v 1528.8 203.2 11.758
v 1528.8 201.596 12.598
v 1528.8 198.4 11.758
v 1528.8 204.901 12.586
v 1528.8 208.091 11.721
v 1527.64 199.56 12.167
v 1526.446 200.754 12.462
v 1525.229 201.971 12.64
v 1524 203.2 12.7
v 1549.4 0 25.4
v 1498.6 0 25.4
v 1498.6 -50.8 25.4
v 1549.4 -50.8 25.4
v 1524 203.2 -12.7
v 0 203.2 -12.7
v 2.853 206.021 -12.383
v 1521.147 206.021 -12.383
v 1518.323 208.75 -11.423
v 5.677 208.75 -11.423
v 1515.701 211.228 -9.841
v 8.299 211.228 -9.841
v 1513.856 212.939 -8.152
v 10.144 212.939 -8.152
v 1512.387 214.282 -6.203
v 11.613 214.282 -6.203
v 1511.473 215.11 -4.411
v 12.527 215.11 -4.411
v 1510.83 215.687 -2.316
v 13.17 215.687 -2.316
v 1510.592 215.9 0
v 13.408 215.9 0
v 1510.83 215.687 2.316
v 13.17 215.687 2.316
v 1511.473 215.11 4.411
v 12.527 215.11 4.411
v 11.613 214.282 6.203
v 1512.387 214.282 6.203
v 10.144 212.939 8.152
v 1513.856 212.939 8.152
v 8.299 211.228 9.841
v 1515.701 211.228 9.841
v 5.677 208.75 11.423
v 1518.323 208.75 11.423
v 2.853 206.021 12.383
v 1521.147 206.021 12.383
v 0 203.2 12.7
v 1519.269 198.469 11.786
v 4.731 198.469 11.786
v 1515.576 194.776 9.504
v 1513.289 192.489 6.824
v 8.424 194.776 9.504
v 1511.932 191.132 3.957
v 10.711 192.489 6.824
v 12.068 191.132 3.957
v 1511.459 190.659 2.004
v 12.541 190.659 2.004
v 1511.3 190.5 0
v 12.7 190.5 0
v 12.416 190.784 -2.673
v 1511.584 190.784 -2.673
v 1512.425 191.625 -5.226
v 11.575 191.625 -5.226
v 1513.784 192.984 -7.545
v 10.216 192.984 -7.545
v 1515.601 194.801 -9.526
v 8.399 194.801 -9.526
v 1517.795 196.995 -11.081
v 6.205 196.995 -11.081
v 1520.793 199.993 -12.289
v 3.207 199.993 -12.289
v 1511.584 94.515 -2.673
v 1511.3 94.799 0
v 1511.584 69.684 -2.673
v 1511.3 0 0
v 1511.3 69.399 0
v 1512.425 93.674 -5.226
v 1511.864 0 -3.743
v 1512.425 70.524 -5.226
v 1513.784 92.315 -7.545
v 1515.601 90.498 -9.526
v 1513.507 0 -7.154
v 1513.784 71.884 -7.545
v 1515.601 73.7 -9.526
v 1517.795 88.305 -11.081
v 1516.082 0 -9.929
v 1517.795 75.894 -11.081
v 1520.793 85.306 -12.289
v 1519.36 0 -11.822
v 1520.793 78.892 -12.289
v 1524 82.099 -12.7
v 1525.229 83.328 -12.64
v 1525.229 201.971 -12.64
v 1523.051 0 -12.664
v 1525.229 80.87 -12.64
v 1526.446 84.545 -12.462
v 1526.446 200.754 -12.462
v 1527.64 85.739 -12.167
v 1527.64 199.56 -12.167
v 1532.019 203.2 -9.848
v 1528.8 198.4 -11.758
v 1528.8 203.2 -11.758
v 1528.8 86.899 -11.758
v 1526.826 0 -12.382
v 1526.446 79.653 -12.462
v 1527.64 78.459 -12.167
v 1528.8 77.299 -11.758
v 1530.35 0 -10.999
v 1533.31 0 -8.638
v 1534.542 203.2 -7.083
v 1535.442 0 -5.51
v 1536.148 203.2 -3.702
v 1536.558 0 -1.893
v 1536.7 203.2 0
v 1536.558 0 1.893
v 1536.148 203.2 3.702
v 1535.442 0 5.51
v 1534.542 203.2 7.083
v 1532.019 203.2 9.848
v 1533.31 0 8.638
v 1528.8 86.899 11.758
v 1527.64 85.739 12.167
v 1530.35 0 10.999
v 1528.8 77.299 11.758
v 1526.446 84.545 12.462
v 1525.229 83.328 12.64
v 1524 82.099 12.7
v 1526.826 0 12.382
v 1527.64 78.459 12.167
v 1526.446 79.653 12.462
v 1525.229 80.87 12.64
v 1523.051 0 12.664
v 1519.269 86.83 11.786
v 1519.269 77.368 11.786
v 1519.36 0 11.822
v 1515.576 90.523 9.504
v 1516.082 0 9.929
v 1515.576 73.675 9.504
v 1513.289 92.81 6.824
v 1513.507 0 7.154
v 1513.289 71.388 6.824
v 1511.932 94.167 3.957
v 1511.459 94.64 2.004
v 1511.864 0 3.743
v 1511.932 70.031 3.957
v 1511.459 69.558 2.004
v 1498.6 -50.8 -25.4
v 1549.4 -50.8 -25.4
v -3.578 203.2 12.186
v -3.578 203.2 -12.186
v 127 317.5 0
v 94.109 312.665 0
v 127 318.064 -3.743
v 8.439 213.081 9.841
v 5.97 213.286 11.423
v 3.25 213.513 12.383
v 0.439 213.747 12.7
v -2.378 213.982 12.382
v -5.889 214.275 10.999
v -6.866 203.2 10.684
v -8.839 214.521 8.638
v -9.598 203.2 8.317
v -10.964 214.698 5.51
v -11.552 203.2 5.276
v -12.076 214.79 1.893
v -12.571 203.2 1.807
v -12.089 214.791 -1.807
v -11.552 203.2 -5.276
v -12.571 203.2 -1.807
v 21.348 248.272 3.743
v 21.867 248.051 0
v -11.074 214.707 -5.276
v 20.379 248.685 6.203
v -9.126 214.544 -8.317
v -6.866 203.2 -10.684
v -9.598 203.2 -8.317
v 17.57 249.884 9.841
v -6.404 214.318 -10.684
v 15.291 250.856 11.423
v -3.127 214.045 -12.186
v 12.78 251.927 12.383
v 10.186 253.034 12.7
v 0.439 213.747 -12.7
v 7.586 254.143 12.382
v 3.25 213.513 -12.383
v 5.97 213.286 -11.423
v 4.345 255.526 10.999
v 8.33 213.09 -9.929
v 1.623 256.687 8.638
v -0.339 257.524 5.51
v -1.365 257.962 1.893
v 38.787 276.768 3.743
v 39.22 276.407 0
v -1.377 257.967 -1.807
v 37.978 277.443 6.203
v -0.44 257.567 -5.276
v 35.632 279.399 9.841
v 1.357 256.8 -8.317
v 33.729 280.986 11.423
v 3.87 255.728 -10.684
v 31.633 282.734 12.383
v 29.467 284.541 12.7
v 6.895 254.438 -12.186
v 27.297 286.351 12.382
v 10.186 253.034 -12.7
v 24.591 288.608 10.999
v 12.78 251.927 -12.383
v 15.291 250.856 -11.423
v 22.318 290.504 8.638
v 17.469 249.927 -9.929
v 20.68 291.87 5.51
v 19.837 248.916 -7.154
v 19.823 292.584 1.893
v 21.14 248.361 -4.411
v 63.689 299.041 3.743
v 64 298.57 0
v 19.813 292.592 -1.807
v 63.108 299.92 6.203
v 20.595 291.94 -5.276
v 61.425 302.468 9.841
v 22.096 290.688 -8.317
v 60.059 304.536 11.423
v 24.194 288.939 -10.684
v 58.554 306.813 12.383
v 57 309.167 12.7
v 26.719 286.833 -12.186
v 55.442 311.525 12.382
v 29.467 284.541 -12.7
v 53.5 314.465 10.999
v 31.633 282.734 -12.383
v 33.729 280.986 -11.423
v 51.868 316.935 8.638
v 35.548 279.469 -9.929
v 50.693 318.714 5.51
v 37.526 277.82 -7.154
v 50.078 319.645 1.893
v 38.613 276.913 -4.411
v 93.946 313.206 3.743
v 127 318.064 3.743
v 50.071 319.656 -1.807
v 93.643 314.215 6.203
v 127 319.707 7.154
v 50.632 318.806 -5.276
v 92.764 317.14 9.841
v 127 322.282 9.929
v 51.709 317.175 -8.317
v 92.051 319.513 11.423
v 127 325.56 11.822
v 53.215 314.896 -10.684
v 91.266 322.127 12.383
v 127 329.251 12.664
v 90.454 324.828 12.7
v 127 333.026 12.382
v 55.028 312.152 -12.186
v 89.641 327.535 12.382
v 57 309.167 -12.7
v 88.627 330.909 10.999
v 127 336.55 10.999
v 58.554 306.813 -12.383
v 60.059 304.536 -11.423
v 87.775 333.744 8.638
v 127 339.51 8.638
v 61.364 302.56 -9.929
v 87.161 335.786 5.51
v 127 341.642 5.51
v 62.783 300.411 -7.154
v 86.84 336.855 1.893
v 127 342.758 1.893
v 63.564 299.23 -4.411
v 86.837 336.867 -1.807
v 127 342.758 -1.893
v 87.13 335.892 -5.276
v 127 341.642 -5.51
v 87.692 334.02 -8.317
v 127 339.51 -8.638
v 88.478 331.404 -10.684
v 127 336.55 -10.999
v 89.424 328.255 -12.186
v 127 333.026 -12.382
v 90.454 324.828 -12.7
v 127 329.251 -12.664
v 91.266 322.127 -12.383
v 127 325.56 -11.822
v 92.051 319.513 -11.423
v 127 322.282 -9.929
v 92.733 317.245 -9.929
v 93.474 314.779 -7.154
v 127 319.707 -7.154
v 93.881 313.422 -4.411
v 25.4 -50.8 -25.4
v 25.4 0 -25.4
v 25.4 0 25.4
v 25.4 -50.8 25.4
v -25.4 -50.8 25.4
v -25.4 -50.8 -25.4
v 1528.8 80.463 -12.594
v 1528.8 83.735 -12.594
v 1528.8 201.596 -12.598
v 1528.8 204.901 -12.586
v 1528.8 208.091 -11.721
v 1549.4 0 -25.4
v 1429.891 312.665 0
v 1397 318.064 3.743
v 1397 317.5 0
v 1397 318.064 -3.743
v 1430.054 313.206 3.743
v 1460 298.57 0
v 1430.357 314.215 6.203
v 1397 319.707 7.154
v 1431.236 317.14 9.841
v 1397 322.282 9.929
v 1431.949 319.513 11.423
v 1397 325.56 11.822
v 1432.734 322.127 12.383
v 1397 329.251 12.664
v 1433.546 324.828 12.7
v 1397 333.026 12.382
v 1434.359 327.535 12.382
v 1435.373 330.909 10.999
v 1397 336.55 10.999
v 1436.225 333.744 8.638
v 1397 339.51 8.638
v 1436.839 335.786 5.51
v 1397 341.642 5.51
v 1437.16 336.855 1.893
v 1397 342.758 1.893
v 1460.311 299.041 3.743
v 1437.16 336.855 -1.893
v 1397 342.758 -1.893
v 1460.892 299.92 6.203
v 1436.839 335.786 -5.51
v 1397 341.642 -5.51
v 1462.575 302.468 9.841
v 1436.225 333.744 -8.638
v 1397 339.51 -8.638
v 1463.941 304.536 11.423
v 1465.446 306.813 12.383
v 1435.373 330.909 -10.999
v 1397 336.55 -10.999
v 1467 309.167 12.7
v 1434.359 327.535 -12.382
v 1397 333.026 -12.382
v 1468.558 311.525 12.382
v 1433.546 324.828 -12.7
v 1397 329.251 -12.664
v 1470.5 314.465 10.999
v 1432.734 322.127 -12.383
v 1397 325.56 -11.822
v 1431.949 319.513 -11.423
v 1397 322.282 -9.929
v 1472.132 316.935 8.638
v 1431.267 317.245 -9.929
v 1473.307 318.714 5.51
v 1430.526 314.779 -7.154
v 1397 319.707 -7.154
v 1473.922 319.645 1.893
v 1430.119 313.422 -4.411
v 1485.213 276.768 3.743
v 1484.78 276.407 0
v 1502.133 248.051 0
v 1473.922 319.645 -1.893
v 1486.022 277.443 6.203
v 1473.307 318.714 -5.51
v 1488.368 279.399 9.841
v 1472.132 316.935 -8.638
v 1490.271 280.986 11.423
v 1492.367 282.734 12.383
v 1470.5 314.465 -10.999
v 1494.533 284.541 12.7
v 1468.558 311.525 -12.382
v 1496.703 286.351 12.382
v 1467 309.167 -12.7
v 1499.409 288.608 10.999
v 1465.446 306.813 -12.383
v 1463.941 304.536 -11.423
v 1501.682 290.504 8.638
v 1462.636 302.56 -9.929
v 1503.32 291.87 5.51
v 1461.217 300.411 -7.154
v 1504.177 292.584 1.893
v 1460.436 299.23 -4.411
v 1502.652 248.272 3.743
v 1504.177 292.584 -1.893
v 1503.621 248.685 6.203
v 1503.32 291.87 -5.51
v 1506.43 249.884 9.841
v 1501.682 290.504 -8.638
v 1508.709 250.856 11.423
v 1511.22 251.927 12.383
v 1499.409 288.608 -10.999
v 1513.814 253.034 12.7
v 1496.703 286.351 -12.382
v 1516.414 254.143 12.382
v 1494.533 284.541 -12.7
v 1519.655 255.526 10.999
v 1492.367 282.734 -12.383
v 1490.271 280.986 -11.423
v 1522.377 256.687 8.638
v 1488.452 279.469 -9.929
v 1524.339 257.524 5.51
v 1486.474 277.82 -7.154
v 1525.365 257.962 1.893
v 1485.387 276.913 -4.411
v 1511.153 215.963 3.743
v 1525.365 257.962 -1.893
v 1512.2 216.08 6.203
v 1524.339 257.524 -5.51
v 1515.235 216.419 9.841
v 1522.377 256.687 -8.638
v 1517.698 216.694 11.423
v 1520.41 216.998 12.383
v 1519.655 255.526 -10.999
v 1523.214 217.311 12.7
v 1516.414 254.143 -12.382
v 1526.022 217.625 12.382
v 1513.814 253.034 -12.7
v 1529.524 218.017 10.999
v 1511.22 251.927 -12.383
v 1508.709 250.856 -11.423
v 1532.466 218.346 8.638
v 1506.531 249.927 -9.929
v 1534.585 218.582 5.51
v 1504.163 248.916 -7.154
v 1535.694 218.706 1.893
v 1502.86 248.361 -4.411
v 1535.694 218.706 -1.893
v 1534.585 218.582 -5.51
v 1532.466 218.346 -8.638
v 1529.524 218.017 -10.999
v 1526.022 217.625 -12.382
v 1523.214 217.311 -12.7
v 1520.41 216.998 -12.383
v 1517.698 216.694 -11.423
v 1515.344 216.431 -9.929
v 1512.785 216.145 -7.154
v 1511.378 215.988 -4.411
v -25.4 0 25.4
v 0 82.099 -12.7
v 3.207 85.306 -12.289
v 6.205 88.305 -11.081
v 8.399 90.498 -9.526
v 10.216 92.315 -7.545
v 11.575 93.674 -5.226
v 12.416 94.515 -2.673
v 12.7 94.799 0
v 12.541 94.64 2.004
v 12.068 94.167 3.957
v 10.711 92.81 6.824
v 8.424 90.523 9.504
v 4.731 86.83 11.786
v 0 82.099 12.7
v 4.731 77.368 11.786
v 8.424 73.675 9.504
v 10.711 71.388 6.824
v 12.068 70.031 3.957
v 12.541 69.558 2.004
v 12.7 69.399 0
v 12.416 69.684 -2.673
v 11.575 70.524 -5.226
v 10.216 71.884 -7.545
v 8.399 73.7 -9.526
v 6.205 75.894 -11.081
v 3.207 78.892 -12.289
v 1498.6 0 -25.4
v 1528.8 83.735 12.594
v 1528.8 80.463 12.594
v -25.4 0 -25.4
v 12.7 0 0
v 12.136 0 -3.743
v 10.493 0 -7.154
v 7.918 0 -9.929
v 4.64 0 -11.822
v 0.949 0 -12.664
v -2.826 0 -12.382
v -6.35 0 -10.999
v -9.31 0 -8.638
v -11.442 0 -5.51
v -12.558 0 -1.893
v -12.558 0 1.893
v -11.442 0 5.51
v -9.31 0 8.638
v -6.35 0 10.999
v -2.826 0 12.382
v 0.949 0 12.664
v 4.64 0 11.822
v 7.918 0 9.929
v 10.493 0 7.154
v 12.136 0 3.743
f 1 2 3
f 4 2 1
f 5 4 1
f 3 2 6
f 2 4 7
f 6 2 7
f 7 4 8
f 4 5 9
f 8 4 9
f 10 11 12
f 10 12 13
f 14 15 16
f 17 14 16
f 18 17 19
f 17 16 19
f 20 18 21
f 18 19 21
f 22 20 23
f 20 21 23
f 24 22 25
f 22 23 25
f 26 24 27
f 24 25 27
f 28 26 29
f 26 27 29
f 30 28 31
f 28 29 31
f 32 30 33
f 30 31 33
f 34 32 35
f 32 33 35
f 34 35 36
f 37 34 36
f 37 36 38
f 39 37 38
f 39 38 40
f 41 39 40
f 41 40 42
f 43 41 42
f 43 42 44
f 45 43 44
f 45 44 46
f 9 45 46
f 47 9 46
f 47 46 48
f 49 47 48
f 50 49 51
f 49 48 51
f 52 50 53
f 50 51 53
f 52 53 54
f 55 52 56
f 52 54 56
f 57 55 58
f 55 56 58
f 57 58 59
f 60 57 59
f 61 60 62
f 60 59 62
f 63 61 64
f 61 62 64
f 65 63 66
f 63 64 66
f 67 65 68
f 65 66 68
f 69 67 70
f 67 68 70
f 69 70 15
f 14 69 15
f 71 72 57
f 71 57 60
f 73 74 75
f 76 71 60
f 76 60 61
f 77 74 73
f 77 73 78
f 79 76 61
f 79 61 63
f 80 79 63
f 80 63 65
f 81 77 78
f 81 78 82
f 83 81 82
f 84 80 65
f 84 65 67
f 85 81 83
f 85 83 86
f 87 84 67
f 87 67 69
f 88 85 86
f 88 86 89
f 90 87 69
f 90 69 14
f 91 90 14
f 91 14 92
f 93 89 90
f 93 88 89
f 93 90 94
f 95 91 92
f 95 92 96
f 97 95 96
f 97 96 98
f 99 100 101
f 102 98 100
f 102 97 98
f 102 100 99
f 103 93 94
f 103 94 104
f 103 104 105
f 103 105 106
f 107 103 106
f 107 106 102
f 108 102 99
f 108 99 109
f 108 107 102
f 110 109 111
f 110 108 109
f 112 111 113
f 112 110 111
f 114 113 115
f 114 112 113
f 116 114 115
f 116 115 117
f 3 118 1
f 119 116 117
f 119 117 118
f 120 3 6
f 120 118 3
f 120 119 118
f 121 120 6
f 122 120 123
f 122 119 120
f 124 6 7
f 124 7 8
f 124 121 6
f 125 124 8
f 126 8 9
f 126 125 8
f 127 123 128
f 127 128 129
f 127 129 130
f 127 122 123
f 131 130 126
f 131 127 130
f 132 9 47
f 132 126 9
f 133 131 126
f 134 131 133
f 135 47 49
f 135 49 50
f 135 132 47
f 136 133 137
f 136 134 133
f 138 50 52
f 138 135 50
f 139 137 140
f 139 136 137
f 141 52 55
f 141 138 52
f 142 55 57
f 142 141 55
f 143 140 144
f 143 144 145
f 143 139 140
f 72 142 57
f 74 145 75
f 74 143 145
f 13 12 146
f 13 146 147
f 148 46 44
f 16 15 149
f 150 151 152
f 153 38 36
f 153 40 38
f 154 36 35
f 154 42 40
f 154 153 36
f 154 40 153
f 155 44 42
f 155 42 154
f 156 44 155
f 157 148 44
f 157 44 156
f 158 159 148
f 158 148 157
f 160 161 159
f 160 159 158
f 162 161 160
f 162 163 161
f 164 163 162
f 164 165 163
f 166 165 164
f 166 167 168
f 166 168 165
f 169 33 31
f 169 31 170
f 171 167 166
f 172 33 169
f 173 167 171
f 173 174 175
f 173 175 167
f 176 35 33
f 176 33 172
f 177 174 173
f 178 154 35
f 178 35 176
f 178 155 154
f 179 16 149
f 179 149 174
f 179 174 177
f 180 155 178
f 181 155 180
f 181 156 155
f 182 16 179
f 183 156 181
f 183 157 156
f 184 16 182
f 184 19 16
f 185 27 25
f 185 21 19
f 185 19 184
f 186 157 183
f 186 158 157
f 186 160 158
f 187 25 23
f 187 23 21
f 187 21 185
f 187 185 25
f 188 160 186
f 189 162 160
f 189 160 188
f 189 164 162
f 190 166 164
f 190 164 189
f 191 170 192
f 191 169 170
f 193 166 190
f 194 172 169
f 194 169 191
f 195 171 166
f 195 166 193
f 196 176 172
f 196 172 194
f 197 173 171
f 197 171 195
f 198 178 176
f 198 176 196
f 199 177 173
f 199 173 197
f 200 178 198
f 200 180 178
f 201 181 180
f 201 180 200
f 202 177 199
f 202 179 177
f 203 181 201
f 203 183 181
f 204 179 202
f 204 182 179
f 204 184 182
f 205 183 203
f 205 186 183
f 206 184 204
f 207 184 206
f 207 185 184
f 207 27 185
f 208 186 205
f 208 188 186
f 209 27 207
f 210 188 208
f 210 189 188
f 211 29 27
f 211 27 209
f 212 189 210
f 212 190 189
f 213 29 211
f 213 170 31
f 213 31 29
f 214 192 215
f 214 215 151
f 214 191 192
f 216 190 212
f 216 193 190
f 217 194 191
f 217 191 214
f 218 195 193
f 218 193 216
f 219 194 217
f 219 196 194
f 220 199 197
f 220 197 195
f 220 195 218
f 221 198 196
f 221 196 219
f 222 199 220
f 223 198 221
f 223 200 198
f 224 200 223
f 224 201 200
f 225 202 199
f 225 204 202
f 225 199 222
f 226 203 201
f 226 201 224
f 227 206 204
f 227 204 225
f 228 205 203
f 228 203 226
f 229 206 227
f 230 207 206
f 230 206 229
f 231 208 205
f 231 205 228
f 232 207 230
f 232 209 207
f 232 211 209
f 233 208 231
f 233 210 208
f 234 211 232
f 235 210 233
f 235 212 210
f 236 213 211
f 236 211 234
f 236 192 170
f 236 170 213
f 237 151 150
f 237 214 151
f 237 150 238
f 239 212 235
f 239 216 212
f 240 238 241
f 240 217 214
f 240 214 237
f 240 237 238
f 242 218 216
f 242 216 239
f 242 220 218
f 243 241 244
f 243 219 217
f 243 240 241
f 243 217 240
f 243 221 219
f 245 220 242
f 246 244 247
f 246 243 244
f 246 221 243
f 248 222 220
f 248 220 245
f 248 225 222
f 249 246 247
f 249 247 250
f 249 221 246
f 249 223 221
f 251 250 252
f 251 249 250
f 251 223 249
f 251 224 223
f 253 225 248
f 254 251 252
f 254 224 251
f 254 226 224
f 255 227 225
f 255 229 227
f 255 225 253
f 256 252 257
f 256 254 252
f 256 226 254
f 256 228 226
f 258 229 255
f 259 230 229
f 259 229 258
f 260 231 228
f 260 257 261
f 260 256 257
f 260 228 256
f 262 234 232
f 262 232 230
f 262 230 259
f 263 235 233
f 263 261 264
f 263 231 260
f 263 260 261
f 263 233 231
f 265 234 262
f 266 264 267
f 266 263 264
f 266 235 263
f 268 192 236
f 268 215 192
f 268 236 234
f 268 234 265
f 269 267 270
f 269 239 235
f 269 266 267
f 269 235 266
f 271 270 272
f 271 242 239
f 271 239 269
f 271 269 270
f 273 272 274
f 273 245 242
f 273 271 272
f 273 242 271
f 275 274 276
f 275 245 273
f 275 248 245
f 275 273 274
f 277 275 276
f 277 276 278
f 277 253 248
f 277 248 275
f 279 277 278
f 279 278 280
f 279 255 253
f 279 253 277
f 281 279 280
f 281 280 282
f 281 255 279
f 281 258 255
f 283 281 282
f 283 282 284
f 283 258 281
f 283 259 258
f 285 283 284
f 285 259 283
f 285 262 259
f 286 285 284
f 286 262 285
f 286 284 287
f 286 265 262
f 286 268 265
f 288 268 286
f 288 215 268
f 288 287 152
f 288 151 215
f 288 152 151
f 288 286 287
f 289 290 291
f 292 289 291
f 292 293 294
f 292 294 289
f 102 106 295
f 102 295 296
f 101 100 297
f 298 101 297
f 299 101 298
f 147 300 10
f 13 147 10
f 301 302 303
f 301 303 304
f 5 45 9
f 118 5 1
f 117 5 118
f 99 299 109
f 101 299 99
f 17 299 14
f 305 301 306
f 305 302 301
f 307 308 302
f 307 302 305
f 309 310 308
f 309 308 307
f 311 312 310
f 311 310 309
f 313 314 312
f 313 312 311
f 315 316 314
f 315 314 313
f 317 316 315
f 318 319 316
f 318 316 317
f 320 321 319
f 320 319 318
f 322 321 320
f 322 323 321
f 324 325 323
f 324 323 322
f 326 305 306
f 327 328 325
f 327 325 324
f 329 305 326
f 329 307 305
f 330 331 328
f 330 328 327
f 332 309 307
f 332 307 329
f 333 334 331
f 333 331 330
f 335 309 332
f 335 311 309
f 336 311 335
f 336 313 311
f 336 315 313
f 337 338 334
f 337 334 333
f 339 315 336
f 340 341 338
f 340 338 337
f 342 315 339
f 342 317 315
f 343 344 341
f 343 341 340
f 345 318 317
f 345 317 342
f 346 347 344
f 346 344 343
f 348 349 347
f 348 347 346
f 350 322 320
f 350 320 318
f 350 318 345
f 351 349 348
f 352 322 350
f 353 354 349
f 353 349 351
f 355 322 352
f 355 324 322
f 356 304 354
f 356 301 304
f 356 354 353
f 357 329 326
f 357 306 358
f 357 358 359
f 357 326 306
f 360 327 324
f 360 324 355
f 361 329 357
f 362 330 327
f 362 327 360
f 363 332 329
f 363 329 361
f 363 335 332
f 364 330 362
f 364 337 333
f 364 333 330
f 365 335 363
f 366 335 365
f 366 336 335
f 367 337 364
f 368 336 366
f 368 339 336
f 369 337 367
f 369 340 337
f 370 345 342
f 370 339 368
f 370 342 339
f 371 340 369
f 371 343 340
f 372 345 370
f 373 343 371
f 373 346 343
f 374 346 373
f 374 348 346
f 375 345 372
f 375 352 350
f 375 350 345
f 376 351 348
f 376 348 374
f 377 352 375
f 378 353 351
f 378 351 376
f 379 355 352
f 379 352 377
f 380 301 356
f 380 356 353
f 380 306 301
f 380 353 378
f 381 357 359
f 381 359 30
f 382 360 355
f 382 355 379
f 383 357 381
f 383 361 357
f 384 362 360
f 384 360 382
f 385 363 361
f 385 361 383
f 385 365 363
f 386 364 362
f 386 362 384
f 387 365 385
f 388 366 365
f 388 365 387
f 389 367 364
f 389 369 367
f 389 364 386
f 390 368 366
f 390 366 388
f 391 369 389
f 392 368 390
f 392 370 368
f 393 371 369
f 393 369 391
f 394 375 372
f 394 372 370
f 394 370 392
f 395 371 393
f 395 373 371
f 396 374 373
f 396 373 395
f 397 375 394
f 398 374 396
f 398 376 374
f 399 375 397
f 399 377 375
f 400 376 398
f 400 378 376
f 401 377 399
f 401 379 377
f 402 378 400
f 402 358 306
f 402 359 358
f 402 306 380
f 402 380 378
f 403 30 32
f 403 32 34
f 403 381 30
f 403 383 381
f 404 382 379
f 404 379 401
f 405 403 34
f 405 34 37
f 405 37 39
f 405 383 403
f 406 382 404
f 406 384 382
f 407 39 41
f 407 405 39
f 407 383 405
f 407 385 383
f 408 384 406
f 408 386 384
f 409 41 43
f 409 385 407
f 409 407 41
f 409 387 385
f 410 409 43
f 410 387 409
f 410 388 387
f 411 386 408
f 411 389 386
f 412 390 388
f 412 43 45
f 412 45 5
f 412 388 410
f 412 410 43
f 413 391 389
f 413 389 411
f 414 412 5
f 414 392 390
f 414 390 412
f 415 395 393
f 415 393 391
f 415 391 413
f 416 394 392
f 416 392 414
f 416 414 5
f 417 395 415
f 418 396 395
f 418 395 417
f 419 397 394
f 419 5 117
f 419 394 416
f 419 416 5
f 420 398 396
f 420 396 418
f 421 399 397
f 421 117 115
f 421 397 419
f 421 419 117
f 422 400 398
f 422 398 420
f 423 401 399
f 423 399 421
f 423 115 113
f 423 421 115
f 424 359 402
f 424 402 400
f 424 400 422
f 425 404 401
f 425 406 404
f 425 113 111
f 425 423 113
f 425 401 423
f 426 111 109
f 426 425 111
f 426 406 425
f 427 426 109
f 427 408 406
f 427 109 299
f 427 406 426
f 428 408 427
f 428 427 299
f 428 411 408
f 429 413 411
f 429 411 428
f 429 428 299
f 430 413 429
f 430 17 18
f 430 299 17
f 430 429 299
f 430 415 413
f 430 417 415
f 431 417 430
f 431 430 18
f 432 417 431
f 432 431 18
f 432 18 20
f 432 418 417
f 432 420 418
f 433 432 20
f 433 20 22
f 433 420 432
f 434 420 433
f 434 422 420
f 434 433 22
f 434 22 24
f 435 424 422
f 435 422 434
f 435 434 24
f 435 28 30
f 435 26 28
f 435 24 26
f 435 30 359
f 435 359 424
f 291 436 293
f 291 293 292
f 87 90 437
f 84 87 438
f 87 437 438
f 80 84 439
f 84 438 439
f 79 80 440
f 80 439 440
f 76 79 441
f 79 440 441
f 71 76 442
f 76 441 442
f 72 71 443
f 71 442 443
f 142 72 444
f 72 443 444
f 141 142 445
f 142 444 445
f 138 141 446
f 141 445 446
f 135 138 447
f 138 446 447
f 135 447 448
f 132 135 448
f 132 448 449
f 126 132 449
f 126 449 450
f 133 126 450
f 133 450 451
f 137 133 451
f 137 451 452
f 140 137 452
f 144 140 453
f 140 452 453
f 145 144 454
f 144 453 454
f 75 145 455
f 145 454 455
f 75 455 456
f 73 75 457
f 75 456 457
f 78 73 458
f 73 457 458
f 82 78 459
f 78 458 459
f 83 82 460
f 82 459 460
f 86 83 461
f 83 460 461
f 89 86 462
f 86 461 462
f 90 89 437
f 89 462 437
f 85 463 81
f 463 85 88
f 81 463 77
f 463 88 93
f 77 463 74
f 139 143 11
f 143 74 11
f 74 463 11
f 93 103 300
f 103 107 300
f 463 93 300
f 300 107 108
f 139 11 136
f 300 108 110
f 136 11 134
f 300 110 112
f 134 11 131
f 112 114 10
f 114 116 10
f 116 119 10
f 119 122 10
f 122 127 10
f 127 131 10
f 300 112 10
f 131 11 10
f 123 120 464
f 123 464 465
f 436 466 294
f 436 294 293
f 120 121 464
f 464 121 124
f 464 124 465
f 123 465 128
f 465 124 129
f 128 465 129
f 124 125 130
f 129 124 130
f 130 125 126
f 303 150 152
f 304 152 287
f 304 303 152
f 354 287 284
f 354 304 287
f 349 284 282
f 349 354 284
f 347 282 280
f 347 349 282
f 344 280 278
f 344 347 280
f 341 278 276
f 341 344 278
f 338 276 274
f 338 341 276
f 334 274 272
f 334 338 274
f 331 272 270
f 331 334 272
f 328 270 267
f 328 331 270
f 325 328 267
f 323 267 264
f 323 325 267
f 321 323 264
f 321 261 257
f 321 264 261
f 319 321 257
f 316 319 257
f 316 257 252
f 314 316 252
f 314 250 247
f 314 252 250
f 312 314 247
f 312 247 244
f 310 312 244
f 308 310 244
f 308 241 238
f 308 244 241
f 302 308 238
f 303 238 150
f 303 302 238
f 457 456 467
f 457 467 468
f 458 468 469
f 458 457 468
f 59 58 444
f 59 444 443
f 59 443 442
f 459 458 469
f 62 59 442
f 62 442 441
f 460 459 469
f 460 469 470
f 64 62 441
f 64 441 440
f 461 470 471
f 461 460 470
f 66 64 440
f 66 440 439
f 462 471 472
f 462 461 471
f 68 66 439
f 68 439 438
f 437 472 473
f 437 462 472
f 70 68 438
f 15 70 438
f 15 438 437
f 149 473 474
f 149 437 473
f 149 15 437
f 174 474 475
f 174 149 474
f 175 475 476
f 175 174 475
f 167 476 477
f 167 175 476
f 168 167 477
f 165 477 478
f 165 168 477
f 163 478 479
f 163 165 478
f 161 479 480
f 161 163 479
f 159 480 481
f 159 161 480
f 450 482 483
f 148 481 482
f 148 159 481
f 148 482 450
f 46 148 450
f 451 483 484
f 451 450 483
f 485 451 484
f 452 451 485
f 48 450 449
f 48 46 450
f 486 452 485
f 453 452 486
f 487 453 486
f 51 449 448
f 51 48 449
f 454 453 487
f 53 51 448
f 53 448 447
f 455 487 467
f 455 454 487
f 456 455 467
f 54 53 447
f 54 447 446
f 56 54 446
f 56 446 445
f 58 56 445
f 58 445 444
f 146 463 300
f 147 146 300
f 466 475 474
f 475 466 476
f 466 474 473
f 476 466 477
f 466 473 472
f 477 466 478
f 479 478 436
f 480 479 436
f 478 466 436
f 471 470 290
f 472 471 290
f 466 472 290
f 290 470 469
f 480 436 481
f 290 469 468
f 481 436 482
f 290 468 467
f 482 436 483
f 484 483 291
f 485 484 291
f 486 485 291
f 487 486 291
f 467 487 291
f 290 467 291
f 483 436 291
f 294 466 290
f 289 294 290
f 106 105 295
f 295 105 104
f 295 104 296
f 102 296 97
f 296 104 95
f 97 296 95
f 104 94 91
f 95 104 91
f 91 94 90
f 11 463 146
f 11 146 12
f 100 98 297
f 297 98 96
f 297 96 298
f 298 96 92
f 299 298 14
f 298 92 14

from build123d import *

# Parameters (mm, degrees)
SKETCH2_R           = 12.7
SKETCH3_W           = 50.8
SKETCH3_H           = 50.8
BOSS_EXTRUDE1_DEPTH = 50.8
SKETCH4_R           = 12.7
BOSS_EXTRUDE2_DEPTH = 1528.8
SKETCH5_R           = 12.7
BOSS_EXTRUDE3_DEPTH = 1528.8


with BuildPart() as part:
    # Sweep1: sweep along a path in Sketch1
    with BuildLine(Plane.XY) as sweep1_path:
        Line((0, 0), (0, 203.2))
        ThreePointArc((0, 203.2), (37.197438789, 293.002561211), (127, 330.2))
        Line((127, 330.2), (1397, 330.2))
        ThreePointArc((1397, 330.2), (1486.802561211, 293.002561211), (1524, 203.2))
        Line((1524, 203.2), (1524, 0))
    # Sketch2 → Sweep1 (sweep)
    with BuildSketch(Plane(origin=(0, 0, 0), x_dir=(1, 0, 0), z_dir=(0, 1, 0))):
        Circle(SKETCH2_R)
    sweep(path=sweep1_path.line)

    # Sketch3 → Boss-Extrude1 (add)
    with BuildSketch(Plane.XZ):
        Rectangle(SKETCH3_W, SKETCH3_H)
        with Locations((1524, 0)):
            Rectangle(SKETCH3_W, SKETCH3_H)
    extrude(amount=BOSS_EXTRUDE1_DEPTH)

    # Sketch4 → Boss-Extrude2 (add)
    with BuildSketch(Plane(origin=(0, 0, 0), x_dir=(0, 0, -1), z_dir=(1, 0, 0))):
        with Locations((0, 203.2)):
            Circle(SKETCH4_R)
    extrude(amount=BOSS_EXTRUDE2_DEPTH)

    # Sketch5 → Boss-Extrude3 (add)
    with BuildSketch(Plane(origin=(0, 0, 0), x_dir=(0, 0, -1), z_dir=(1, 0, 0))):
        with Locations((0, 82.09908093)):
            Circle(SKETCH5_R)
    extrude(amount=BOSS_EXTRUDE3_DEPTH)


solid = part.part
